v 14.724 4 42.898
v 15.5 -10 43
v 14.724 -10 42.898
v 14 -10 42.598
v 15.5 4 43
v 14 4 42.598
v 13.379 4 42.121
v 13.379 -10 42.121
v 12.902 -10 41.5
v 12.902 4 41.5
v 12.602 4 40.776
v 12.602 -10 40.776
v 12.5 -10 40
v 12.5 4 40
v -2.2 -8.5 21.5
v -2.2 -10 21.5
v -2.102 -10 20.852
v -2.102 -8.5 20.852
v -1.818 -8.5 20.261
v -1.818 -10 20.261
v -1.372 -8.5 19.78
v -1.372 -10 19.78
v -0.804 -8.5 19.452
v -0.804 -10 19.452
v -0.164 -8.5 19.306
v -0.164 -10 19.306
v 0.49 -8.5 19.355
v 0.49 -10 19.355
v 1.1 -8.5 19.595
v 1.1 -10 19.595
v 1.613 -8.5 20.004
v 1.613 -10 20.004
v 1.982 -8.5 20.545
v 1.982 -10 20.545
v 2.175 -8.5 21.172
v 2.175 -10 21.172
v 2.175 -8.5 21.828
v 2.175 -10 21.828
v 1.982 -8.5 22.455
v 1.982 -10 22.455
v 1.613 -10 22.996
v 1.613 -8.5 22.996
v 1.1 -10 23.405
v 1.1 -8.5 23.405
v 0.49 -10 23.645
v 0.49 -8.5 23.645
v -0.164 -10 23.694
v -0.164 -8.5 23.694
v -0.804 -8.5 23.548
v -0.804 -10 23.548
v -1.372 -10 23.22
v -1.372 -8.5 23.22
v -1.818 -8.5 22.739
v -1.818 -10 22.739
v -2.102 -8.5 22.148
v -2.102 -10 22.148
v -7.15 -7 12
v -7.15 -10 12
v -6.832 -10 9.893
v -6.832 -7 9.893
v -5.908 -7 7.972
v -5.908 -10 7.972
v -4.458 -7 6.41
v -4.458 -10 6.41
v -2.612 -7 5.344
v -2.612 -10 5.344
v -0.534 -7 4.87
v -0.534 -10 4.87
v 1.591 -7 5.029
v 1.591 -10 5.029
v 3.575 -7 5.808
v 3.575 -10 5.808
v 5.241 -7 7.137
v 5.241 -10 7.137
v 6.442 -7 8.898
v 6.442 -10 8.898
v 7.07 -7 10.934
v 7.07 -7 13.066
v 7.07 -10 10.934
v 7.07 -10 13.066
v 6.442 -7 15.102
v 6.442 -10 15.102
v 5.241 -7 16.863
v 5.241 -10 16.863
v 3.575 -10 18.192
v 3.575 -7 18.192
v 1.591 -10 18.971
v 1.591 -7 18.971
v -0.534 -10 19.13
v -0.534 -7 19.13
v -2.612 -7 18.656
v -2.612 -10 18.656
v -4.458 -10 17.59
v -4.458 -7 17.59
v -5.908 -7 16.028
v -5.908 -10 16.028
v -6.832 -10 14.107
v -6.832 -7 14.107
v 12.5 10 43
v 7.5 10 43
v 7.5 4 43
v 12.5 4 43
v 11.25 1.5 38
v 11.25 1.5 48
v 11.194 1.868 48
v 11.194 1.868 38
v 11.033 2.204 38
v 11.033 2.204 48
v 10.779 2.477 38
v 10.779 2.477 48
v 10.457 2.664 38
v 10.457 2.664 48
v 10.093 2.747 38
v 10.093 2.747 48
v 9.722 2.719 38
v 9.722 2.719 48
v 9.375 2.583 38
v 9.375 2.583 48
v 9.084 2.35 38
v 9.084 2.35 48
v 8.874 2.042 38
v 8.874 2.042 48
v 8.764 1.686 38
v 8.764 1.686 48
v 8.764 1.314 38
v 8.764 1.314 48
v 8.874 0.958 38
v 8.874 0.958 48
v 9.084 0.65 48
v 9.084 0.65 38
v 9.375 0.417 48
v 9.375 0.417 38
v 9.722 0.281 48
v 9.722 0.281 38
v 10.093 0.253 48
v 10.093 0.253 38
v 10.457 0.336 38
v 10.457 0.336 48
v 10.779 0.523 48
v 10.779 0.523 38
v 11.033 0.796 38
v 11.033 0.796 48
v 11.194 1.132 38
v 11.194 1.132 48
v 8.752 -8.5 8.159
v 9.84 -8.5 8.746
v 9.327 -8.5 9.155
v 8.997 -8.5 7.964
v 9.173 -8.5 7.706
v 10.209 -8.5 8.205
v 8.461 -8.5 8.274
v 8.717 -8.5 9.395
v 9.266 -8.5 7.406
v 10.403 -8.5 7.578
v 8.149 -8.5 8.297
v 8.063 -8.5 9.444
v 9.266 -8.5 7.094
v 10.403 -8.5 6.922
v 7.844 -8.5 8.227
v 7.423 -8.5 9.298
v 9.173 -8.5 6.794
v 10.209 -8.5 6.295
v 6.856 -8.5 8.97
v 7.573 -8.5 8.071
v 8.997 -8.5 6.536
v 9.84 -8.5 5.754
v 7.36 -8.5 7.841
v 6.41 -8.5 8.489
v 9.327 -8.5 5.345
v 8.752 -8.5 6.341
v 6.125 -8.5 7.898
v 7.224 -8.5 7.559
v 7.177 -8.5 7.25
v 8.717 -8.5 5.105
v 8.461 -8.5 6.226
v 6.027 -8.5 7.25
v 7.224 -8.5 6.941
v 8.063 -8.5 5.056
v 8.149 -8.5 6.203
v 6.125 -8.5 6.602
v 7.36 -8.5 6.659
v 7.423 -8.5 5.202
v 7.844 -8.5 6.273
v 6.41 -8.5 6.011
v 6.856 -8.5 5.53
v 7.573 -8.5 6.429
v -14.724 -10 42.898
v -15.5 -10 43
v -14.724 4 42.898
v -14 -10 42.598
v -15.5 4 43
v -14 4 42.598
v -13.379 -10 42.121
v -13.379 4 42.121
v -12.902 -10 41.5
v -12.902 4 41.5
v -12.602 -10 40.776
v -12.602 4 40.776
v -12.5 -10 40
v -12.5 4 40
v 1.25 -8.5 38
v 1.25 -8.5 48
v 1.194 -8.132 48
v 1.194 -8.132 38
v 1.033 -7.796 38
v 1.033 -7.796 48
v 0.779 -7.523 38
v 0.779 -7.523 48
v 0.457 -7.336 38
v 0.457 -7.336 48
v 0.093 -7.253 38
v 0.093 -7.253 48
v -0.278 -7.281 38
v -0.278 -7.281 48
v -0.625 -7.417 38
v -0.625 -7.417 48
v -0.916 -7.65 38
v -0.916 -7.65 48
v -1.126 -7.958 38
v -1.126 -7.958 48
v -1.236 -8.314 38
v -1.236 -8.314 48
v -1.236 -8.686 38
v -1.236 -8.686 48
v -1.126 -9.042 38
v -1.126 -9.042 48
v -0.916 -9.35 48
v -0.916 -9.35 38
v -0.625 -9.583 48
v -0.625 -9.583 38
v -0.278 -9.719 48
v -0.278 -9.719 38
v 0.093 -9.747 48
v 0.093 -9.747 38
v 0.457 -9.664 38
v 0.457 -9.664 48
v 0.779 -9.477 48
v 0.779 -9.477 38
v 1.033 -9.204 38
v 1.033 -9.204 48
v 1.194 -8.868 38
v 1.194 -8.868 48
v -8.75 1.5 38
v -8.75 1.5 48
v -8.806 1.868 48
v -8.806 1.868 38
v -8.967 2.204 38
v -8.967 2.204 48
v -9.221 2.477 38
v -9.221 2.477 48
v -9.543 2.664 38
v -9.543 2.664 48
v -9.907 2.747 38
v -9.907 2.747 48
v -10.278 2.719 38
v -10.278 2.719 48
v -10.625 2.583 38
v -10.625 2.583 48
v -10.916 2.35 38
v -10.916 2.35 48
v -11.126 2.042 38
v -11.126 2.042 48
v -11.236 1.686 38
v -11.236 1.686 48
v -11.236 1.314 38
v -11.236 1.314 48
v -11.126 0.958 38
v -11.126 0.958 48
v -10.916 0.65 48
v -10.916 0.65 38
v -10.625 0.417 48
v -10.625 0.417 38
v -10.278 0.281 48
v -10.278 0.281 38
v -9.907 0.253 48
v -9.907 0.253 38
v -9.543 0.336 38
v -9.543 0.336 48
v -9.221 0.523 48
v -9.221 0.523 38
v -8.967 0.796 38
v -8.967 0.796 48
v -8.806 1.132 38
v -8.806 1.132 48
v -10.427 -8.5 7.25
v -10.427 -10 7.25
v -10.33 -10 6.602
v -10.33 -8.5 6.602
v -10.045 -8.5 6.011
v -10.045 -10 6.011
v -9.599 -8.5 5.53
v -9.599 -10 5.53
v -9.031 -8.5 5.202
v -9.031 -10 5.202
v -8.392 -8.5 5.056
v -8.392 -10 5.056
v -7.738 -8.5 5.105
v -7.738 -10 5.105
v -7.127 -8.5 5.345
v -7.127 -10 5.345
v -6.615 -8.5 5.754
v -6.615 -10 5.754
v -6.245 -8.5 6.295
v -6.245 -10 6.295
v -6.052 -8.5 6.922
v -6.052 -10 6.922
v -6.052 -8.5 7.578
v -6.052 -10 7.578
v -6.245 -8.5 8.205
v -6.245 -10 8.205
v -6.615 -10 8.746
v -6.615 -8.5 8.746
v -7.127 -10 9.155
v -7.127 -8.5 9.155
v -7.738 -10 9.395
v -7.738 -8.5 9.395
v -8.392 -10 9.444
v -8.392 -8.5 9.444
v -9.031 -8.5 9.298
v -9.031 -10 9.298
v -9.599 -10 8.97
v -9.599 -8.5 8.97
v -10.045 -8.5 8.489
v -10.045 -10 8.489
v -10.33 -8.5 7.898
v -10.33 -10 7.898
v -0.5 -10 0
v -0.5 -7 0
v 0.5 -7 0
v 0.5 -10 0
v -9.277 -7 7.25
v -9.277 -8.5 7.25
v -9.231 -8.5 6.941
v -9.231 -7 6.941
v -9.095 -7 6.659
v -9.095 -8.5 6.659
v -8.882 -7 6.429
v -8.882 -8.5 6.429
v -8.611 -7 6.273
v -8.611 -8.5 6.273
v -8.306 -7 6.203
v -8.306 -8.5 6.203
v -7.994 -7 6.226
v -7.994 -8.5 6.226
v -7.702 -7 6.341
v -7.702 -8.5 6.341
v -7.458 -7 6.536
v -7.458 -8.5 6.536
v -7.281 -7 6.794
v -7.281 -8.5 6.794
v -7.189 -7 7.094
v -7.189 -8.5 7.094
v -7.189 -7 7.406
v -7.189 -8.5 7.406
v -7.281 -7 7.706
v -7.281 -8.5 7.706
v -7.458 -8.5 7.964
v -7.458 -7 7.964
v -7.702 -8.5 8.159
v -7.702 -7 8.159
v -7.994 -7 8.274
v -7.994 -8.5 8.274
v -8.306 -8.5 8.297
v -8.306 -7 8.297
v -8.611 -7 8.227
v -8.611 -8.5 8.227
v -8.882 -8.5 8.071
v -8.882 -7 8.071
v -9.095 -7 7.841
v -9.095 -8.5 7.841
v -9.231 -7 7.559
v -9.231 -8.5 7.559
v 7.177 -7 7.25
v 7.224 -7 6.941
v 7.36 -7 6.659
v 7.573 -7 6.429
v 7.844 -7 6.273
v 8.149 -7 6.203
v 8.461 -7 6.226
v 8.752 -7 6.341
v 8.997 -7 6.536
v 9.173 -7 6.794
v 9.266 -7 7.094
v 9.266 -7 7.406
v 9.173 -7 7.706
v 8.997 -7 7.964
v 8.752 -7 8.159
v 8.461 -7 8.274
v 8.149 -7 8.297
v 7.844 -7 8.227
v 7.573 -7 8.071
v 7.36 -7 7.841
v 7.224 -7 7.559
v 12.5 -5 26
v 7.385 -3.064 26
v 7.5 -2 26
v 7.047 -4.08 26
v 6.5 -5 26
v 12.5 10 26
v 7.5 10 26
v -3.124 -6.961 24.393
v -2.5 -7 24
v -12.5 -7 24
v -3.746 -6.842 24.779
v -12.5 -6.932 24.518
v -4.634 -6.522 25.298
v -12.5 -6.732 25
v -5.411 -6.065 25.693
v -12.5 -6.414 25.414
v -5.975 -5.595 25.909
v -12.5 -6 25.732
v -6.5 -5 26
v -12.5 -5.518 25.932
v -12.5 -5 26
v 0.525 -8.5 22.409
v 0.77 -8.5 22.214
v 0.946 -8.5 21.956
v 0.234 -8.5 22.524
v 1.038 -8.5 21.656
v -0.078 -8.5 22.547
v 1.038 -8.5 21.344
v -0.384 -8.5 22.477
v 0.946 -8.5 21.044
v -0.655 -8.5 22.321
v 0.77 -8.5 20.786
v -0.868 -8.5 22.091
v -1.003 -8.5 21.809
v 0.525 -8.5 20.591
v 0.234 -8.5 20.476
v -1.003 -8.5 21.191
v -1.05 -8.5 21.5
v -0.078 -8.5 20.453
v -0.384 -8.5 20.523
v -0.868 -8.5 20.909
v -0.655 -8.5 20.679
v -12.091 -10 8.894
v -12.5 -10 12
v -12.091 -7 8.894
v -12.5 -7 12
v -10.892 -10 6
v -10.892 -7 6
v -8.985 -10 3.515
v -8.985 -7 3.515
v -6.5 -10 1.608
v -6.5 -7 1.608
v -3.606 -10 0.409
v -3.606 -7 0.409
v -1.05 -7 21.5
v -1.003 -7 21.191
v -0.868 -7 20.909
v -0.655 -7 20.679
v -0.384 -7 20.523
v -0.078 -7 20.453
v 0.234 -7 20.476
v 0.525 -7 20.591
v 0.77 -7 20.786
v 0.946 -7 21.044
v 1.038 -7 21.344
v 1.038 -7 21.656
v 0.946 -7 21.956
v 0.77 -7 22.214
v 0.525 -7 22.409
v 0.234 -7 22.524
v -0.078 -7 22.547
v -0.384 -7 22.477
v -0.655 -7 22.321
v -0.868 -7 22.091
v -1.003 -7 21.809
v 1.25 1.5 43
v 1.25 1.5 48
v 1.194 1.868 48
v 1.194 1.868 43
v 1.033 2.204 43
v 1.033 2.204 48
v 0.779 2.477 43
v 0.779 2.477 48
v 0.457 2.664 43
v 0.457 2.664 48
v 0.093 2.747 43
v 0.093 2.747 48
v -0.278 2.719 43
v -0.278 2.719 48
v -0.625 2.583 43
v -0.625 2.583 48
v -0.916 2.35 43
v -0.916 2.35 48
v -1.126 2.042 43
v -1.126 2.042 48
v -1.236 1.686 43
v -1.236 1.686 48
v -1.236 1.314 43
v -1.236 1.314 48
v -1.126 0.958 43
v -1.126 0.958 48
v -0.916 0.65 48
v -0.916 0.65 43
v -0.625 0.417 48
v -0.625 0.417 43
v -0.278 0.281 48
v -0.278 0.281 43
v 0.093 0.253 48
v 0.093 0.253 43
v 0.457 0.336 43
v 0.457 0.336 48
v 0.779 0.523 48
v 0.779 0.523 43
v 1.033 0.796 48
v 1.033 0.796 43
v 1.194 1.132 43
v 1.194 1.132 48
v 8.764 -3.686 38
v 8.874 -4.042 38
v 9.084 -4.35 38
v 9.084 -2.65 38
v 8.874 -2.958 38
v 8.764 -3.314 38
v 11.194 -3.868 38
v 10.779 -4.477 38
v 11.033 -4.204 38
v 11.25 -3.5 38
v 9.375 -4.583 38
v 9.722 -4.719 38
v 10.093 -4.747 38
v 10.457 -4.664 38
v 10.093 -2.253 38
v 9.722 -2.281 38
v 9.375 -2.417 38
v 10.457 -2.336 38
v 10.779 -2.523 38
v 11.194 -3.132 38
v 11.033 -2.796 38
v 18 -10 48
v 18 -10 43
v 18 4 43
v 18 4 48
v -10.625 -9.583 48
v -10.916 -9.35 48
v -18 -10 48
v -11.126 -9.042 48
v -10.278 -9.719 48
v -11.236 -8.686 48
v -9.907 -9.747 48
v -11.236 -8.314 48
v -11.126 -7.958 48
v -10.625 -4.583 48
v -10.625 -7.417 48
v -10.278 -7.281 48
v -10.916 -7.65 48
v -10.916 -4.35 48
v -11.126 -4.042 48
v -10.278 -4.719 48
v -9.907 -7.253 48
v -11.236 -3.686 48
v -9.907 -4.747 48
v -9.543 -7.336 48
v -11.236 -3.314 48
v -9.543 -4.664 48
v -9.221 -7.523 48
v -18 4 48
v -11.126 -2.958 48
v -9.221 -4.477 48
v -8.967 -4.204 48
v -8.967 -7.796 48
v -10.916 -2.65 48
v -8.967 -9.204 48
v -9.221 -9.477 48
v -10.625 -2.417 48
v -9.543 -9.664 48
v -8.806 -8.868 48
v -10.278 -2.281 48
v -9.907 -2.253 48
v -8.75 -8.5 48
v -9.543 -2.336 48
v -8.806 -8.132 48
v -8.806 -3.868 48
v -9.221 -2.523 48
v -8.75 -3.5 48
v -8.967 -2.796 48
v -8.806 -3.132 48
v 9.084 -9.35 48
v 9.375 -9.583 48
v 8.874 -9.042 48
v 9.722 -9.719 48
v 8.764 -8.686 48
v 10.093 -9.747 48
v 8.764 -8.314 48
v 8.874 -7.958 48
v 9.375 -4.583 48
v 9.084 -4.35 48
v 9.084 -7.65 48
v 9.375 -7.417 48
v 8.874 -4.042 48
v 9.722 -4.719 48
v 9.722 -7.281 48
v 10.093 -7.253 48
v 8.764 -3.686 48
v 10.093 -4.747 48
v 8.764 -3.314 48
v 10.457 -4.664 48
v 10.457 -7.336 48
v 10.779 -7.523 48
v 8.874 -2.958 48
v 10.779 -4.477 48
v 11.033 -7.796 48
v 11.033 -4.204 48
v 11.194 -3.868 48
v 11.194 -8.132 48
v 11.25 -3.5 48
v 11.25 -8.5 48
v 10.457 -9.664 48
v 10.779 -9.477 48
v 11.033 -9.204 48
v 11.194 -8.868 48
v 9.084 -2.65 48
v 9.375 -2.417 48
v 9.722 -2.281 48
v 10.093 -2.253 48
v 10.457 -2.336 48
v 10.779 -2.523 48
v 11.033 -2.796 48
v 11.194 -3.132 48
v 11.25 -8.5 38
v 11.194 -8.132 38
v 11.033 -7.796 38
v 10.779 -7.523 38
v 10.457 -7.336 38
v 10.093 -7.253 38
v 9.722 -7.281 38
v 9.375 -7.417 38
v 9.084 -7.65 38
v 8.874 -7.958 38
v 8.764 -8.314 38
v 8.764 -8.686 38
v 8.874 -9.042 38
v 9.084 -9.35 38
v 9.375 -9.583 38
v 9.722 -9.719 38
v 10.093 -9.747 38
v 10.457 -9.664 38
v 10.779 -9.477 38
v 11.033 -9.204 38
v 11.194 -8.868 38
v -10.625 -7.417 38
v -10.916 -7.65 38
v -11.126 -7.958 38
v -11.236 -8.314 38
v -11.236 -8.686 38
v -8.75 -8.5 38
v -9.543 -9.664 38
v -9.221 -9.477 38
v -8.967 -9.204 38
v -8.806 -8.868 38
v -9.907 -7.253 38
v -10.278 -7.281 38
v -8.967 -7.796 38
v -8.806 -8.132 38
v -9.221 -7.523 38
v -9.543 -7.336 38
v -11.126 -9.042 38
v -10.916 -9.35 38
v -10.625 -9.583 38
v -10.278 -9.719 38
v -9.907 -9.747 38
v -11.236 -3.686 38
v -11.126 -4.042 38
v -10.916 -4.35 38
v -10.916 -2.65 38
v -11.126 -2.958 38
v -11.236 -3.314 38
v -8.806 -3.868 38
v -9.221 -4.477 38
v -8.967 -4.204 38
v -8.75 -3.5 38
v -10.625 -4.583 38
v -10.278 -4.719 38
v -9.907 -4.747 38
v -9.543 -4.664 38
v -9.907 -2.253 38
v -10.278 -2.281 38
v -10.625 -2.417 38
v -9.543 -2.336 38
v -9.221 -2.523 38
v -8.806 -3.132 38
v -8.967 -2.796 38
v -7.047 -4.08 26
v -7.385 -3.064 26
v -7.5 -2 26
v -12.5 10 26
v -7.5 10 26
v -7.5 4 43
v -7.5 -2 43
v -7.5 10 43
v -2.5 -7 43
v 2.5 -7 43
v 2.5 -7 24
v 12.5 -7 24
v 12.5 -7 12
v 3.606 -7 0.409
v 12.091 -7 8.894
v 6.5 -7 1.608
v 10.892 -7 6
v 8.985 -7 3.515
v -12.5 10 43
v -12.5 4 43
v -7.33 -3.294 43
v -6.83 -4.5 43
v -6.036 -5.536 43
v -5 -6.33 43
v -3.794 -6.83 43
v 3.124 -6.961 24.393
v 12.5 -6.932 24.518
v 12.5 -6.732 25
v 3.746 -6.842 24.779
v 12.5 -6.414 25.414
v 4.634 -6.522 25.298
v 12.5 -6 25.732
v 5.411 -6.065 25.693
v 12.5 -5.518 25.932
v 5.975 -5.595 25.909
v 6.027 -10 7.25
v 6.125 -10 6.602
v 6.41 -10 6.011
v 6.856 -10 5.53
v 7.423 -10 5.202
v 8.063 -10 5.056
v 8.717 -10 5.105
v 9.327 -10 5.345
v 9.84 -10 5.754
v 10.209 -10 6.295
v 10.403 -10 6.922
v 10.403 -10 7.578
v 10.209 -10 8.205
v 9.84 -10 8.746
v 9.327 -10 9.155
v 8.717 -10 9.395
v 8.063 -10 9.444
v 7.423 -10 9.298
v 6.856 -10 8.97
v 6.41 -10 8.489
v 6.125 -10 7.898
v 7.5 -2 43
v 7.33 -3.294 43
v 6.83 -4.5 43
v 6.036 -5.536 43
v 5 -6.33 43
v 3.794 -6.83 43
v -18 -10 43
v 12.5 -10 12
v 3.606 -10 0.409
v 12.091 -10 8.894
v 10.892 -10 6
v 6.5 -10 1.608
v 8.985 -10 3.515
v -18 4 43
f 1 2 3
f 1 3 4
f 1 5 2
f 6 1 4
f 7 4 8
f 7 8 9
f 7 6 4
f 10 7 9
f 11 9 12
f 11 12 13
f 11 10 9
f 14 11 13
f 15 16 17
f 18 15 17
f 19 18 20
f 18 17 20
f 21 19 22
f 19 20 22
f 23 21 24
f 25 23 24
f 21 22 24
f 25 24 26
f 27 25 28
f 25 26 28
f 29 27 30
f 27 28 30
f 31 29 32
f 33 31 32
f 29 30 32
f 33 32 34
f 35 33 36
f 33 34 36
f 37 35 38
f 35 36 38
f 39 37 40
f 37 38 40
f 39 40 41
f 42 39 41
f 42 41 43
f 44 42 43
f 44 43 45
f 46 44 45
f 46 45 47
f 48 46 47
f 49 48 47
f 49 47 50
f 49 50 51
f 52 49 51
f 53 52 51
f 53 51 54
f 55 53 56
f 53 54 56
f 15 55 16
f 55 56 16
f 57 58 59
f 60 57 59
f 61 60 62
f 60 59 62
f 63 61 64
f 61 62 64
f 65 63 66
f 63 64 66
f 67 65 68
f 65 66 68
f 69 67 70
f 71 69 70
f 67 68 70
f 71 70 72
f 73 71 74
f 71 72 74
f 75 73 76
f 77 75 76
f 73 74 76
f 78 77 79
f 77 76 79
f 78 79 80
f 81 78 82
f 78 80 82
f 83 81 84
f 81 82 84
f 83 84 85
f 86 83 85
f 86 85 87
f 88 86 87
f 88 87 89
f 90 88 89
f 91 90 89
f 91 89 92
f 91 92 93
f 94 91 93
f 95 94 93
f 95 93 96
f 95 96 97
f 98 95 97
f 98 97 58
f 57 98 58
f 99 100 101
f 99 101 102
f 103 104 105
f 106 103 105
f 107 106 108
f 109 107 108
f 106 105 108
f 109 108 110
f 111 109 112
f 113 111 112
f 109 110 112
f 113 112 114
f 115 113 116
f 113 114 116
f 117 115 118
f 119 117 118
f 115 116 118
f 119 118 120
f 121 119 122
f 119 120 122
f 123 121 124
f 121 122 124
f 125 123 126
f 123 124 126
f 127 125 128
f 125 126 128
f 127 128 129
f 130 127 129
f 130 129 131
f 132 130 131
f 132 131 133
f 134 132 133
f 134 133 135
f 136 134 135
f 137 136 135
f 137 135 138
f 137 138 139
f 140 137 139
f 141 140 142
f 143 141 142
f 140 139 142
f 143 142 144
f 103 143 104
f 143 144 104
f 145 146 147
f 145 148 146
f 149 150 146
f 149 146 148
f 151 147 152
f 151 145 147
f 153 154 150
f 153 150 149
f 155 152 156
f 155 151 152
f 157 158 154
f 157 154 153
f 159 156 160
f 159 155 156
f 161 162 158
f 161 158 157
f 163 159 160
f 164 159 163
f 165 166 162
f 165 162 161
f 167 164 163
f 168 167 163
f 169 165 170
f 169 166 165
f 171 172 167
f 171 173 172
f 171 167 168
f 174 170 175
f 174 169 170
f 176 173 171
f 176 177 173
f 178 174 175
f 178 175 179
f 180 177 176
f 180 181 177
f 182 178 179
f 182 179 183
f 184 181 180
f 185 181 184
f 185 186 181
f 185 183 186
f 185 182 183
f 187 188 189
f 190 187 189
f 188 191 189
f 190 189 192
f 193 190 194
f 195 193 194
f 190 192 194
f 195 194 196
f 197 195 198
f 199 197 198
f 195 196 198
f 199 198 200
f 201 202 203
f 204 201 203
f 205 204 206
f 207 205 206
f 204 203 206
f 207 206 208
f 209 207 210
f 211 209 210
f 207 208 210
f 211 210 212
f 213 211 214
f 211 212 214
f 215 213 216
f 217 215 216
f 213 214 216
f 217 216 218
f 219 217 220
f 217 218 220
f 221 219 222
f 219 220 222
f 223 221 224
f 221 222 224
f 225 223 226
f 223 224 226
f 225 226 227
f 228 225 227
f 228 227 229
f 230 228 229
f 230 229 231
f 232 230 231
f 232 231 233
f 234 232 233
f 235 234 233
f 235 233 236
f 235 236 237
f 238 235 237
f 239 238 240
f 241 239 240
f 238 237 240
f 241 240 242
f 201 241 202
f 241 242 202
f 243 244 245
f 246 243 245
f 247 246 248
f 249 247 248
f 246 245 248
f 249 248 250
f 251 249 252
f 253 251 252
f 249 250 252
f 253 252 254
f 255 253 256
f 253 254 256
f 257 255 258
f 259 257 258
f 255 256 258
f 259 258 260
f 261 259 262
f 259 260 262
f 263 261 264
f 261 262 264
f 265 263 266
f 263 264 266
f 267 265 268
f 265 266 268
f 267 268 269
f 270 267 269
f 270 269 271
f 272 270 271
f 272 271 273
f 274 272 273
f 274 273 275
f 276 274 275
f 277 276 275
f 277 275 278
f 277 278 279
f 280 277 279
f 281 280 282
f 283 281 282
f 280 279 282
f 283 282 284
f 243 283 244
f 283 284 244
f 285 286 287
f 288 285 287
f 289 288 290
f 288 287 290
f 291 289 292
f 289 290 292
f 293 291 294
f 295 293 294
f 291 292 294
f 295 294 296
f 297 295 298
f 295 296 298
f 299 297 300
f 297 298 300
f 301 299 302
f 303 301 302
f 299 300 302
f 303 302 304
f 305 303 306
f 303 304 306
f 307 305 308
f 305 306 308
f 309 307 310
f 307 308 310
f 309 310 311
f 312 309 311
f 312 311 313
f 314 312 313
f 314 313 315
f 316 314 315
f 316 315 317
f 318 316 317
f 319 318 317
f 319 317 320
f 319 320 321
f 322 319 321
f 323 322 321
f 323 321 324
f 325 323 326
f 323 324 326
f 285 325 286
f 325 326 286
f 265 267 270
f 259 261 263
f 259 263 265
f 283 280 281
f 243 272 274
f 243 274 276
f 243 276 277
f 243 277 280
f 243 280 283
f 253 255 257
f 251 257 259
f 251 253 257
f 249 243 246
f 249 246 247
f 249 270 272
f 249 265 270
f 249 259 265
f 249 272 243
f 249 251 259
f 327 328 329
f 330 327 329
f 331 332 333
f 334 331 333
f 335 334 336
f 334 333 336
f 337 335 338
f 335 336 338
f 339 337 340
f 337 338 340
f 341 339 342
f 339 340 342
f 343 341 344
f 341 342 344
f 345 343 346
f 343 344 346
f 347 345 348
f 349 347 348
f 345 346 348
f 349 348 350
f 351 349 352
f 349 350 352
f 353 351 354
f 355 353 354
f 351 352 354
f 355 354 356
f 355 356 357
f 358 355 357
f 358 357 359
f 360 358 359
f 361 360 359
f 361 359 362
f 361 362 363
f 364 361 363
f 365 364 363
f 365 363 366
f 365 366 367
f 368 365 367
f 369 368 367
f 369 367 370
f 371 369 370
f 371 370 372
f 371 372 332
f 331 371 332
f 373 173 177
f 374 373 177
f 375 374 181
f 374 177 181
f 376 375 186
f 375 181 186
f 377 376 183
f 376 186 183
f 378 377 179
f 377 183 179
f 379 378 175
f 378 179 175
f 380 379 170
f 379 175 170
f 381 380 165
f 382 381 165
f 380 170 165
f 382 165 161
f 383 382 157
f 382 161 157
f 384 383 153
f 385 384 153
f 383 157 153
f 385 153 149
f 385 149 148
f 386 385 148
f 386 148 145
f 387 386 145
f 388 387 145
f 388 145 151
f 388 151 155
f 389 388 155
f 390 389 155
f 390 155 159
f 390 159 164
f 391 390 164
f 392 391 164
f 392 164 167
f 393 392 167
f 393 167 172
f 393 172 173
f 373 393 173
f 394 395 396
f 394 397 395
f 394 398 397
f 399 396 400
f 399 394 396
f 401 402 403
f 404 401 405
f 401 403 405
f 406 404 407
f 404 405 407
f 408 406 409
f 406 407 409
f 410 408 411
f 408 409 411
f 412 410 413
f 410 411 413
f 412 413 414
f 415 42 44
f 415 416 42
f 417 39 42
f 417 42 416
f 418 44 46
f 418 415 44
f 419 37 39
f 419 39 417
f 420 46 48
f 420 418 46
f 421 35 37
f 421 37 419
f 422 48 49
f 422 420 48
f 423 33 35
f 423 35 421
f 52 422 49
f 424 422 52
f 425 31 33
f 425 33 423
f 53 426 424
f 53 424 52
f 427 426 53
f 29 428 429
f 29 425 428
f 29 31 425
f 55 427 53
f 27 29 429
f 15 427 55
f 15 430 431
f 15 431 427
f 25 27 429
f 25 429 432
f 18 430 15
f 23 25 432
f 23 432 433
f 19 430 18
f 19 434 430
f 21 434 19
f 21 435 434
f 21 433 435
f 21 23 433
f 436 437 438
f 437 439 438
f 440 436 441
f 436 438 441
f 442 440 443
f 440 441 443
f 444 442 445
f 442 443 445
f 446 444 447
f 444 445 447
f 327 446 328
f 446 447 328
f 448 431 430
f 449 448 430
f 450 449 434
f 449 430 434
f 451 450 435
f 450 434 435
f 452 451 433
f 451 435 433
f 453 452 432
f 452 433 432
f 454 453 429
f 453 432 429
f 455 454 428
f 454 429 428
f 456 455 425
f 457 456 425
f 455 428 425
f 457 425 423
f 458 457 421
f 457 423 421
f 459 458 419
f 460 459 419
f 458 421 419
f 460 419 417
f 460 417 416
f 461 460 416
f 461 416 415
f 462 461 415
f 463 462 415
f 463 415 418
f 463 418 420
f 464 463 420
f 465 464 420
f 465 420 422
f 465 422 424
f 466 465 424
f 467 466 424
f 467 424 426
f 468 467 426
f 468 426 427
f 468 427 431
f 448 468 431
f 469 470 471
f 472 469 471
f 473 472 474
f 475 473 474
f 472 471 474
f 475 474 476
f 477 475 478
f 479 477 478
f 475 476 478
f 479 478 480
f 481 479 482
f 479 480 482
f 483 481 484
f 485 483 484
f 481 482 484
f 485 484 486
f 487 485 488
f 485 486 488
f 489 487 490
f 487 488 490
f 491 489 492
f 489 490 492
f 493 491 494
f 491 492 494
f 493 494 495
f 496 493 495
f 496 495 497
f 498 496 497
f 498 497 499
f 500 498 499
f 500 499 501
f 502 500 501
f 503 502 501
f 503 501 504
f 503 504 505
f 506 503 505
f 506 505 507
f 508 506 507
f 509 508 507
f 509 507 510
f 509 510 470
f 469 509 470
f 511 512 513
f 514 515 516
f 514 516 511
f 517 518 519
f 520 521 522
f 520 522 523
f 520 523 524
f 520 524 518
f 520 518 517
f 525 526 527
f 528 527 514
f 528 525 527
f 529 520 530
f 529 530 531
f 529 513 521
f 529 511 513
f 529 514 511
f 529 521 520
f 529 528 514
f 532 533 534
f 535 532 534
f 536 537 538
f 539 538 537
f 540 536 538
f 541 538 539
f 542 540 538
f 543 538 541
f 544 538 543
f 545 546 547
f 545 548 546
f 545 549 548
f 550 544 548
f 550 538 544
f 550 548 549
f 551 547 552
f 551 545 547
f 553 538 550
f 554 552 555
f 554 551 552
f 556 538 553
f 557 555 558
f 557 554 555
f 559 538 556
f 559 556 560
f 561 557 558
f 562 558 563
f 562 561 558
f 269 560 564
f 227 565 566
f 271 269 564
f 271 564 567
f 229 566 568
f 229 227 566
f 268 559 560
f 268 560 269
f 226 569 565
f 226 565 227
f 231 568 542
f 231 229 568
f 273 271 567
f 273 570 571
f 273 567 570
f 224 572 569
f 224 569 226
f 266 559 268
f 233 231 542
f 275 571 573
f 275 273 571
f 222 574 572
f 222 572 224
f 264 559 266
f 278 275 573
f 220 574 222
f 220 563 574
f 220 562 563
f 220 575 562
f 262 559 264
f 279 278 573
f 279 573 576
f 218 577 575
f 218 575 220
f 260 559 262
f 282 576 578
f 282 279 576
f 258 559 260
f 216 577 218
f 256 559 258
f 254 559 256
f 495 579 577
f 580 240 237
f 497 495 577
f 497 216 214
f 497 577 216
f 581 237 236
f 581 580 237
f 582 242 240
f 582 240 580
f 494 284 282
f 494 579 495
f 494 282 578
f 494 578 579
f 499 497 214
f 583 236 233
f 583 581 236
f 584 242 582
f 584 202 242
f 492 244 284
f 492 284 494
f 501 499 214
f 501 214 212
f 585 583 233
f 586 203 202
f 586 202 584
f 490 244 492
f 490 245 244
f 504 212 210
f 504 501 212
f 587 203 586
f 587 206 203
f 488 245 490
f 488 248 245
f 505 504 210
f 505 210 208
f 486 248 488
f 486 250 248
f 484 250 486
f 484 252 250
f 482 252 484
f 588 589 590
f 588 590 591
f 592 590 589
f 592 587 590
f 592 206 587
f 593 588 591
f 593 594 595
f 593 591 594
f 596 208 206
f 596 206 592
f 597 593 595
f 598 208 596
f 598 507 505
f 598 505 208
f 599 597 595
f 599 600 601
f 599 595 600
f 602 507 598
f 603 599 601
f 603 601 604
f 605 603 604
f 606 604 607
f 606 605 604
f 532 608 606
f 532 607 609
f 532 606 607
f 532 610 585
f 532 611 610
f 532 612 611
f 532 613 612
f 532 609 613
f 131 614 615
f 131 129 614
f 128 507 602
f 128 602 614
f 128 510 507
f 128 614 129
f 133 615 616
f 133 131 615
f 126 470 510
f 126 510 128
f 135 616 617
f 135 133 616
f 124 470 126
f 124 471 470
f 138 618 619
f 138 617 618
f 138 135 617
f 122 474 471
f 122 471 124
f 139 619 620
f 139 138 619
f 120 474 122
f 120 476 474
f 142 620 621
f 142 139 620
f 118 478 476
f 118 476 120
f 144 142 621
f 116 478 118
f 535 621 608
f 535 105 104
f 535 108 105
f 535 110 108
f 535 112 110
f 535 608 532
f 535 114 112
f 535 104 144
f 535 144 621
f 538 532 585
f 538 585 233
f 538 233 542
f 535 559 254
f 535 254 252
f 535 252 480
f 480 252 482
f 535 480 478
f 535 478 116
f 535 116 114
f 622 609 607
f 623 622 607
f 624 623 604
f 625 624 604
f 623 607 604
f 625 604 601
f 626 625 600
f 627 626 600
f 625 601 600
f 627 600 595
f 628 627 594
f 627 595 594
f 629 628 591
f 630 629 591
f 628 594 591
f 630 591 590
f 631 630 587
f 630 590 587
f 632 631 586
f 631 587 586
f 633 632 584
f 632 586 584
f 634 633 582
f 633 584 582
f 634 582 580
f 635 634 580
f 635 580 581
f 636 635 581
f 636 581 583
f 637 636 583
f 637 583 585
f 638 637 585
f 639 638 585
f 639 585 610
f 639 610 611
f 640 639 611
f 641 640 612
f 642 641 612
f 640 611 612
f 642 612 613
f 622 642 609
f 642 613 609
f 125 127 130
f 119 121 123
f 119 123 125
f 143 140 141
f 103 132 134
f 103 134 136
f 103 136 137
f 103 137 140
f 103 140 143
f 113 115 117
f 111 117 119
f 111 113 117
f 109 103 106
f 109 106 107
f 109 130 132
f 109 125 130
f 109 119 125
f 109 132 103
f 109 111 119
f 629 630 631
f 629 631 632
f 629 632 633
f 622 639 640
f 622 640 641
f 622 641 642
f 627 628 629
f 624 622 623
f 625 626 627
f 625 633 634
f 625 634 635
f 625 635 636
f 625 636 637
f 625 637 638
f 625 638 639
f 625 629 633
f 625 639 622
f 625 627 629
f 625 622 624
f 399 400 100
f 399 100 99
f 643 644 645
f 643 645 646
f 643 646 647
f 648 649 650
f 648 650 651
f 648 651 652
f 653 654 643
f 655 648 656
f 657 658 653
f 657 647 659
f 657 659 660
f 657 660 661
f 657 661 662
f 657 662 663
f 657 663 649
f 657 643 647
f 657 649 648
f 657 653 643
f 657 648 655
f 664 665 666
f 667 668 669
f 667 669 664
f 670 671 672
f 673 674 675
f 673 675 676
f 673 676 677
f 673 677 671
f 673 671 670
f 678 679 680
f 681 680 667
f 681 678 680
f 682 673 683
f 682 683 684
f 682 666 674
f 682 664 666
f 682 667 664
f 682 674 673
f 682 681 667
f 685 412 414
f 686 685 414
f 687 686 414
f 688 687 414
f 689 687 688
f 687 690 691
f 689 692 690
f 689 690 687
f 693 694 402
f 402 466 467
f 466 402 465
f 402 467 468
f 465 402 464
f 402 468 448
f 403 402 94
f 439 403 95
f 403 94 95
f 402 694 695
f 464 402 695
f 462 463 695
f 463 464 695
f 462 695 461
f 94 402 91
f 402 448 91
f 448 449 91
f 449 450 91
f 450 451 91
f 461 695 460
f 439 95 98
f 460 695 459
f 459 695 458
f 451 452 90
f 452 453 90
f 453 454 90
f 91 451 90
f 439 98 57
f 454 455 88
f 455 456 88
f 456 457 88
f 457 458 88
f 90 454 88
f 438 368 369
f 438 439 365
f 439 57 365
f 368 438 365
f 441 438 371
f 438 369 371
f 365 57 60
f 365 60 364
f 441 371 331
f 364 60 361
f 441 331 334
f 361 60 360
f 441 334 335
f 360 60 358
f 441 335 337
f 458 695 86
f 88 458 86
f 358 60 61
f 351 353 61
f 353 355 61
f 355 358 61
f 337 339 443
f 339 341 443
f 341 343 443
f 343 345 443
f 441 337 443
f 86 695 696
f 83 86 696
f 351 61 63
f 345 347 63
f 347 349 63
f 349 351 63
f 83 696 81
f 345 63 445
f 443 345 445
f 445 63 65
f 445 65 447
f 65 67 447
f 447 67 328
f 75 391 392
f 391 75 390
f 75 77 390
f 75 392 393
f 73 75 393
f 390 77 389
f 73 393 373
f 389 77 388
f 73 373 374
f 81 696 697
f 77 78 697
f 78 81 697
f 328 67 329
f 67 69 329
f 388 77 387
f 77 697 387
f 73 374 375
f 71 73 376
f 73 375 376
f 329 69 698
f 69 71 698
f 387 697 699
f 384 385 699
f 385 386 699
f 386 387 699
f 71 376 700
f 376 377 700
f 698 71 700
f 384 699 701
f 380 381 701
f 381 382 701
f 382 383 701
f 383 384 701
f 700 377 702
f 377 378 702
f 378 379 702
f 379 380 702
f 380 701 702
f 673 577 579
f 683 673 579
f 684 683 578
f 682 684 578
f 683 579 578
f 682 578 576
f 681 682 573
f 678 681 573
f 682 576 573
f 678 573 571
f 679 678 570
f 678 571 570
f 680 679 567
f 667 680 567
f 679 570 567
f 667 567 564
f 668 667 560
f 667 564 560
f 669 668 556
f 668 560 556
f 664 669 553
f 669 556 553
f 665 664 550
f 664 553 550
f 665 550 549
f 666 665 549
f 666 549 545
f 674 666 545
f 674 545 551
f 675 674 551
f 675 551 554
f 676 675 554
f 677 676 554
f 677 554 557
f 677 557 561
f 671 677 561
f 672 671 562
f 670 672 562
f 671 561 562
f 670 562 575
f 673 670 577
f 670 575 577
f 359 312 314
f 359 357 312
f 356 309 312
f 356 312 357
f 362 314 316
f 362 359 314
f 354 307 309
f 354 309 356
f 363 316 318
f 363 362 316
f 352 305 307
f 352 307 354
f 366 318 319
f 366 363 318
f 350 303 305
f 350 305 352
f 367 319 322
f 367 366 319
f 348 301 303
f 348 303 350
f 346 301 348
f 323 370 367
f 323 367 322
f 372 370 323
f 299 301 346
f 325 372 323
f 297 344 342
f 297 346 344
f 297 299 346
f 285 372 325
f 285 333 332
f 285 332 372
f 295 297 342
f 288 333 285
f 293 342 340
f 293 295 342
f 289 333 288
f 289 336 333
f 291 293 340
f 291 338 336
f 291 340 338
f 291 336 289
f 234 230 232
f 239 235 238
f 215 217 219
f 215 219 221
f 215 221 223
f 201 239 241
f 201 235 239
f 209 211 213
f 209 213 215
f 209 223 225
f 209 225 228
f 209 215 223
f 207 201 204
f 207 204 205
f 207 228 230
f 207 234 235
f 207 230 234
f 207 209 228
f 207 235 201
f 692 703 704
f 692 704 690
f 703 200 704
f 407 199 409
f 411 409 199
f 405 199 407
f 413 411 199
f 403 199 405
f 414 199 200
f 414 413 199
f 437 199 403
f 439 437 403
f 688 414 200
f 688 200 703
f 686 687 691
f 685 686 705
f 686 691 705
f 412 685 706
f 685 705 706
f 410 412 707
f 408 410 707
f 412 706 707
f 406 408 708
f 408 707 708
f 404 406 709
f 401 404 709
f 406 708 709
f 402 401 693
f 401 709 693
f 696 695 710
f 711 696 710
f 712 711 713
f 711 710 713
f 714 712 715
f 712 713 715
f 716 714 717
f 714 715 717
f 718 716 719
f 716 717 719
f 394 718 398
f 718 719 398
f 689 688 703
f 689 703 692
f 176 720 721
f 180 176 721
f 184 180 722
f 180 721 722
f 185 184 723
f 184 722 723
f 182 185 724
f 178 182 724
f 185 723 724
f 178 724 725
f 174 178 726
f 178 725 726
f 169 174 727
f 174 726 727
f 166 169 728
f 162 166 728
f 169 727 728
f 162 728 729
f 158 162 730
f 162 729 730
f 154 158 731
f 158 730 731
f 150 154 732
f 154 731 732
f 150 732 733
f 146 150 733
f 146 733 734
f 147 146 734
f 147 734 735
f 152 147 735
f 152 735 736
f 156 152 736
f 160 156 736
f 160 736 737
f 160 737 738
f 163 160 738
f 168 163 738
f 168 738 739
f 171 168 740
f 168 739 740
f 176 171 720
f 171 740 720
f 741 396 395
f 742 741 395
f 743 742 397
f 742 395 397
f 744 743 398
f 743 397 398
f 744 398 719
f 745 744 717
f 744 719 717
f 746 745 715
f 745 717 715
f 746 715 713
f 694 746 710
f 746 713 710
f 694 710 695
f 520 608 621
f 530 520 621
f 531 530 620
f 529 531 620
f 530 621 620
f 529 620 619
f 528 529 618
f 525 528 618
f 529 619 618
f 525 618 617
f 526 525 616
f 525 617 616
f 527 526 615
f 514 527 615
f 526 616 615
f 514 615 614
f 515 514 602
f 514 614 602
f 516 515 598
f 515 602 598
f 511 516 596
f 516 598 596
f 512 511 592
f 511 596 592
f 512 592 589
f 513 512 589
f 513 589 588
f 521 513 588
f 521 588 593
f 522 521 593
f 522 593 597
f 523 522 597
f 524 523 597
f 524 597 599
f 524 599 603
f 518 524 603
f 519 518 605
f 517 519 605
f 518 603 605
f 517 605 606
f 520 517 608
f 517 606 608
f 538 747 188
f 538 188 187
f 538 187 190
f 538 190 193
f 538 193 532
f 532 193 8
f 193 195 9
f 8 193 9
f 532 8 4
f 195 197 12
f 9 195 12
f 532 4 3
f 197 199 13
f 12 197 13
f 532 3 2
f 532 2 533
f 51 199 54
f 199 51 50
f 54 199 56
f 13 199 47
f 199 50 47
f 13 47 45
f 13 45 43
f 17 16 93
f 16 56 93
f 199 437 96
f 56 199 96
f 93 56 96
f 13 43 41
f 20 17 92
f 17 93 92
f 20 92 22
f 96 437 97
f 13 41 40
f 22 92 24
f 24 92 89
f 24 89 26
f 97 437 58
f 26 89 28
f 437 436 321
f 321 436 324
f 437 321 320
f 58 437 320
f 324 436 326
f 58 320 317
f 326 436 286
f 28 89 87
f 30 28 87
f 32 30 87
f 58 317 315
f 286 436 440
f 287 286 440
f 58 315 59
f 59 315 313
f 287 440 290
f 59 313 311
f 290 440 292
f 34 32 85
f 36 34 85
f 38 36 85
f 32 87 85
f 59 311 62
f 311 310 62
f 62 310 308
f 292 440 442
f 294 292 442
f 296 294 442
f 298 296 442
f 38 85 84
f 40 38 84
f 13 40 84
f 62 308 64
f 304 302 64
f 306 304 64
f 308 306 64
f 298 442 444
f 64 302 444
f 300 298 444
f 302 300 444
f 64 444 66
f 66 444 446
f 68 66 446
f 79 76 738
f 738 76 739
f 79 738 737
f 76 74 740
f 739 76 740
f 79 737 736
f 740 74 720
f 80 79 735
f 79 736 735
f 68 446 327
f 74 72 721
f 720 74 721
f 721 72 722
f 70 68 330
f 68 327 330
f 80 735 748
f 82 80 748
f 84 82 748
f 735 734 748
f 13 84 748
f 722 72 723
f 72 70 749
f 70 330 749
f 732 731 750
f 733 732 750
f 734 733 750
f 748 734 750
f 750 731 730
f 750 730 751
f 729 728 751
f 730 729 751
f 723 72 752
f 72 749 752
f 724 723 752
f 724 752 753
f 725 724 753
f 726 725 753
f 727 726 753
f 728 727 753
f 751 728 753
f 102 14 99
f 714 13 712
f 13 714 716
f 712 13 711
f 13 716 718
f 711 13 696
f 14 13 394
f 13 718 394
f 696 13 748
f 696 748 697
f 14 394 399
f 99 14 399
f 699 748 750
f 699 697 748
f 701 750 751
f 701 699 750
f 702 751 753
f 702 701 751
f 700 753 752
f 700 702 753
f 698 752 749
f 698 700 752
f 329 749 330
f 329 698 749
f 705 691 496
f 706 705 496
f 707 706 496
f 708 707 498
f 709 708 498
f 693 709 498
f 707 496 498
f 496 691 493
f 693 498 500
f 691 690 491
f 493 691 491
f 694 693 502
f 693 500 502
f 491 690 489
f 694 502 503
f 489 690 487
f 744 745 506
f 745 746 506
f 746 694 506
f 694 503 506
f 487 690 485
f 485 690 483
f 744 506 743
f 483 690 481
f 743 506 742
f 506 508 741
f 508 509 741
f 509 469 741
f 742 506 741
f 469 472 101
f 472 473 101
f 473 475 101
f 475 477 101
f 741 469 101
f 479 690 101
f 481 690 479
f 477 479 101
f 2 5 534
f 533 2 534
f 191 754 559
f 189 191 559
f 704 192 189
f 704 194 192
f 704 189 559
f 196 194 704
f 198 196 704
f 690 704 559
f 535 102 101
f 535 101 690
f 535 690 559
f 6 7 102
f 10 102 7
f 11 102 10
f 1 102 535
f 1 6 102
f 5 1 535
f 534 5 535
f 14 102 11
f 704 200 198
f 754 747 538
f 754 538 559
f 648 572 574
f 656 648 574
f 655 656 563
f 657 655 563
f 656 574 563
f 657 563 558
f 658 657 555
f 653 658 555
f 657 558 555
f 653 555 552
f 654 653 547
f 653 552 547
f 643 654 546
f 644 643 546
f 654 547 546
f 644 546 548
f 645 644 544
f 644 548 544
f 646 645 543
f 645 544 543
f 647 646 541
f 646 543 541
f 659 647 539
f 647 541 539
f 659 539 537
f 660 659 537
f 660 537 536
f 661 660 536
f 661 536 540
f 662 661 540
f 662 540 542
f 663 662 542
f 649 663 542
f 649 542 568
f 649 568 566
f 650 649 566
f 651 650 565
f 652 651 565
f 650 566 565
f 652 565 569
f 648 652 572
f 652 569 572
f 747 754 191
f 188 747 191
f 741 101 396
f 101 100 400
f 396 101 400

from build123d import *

# Parameters (mm, degrees)
SKETCH1_W            = 25
SKETCH1_H            = 20
MAIN_DEPTH           = 43
SKETCH5_R            = 1.05
SKETCH5_R_2          = 7.15
MAINANDFIXHOLE_DEPTH = 21
SKETCH6_R            = 2.2
CODERFIXHOLE2_DEPTH  = 1.5
SKETCH7_W            = 26
SKETCH7_H            = 17
CODERHOLE_DEPTH      = 26
SKETCH10_W           = 36
SKETCH10_H           = 14
LINK_DEPTH           = 5
SKETCH8_R            = 1.25
VERTICALHOLES_DEPTH  = 10
SKETCH9_W            = 15
SKETCH9_H            = 17
CUT_EXTRUDE6_DEPTH   = 17
FILLET2_R            = 2
FILLET3_R            = 5
FILLET4_R            = 3
FILLET5_R            = 12


with BuildPart() as part:
    # Sketch1 → Main (new body)
    with BuildSketch(Plane.XY):
        Rectangle(SKETCH1_W, SKETCH1_H)
    extrude(amount=MAIN_DEPTH)

    # Sketch5 → MainAndFixHole (cut, through all)
    with BuildSketch(Plane(origin=(0, -10, 0), x_dir=(-1, 0, 0), z_dir=(0, -1, 0))):
        with Locations((0, -21.5)):
            Circle(SKETCH5_R)
        with Locations((-8.227241336, -7.25)):
            Circle(SKETCH5_R)
        with Locations((8.227241336, -7.25)):
            Circle(SKETCH5_R)
        with Locations((0, -12)):
            Circle(SKETCH5_R_2)
    extrude(amount=-MAINANDFIXHOLE_DEPTH, mode=Mode.SUBTRACT)

    # Sketch6 → CoderFixHole2 (cut)
    with BuildSketch(Plane(origin=(0, -10, 0), x_dir=(-1, 0, 0), z_dir=(0, -1, 0))):
        with Locations((0, -21.5)):
            Circle(SKETCH6_R)
        with Locations((-8.227241336, -7.25)):
            Circle(SKETCH6_R)
        with Locations((8.227241336, -7.25)):
            Circle(SKETCH6_R)
    extrude(amount=-CODERFIXHOLE2_DEPTH, mode=Mode.SUBTRACT)

    # Sketch7 → CoderHole (cut, through all)
    with BuildSketch(Plane(origin=(12.5, 0, 0), x_dir=(0, 0, -1), z_dir=(1, 0, 0))):
        with Locations((-13, 1.5)):
            Rectangle(SKETCH7_W, SKETCH7_H)
    extrude(amount=-CODERHOLE_DEPTH, mode=Mode.SUBTRACT)

    # Sketch10 → Link (add)
    with BuildSketch(Plane.XY.offset(43)):
        with Locations((0, -3)):
            Rectangle(SKETCH10_W, SKETCH10_H)
    extrude(amount=LINK_DEPTH)

    # Sketch8 → VerticalHoles (cut)
    with BuildSketch(Plane.XY.offset(48)):
        with Locations((-10, 1.5)):
            Circle(SKETCH8_R)
        with Locations((-10, -8.5)):
            Circle(SKETCH8_R)
        with Locations((10, -8.5)):
            Circle(SKETCH8_R)
        with Locations((10, 1.5)):
            Circle(SKETCH8_R)
        with Locations((-10, -3.5)):
            Circle(SKETCH8_R)
        with Locations((10, -3.5)):
            Circle(SKETCH8_R)
        with Locations((0, 1.5)):
            Circle(SKETCH8_R)
        with Locations((0, -8.5)):
            Circle(SKETCH8_R)
    extrude(amount=-VERTICALHOLES_DEPTH, mode=Mode.SUBTRACT)

    # Sketch9 → Cut-Extrude6 (cut)
    with BuildSketch(Plane(origin=(0, 10, 0), x_dir=(1, 0, 0), z_dir=(0, 1, 0))):
        with Locations((0, -34.5)):
            Rectangle(SKETCH9_W, SKETCH9_H)
    extrude(amount=-CUT_EXTRUDE6_DEPTH, mode=Mode.SUBTRACT)

    # Fillet2
    fillet2_edges = [part.edges().sort_by_distance(p)[0] for p in [
        (10, -7, 26),
        (-10, -7, 26),
    ]]
    fillet(fillet2_edges, radius=FILLET2_R)

    # Fillet3
    fillet3_edges = [part.edges().sort_by_distance(p)[0] for p in [
        (-7.5, -7, 34.5),
        (7.5, -7, 34.5),
    ]]
    fillet(fillet3_edges, radius=FILLET3_R)

    # Fillet4
    fillet4_edges = [part.edges().sort_by_distance(p)[0] for p in [
        (12.5, -3, 43),
        (-12.5, -3, 43),
    ]]
    fillet(fillet4_edges, radius=FILLET4_R)

    # Fillet5
    fillet5_edges = [part.edges().sort_by_distance(p)[0] for p in [
        (-12.5, -8.5, 0),
        (12.5, -8.5, 0),
    ]]
    fillet(fillet5_edges, radius=FILLET5_R)


solid = part.part
